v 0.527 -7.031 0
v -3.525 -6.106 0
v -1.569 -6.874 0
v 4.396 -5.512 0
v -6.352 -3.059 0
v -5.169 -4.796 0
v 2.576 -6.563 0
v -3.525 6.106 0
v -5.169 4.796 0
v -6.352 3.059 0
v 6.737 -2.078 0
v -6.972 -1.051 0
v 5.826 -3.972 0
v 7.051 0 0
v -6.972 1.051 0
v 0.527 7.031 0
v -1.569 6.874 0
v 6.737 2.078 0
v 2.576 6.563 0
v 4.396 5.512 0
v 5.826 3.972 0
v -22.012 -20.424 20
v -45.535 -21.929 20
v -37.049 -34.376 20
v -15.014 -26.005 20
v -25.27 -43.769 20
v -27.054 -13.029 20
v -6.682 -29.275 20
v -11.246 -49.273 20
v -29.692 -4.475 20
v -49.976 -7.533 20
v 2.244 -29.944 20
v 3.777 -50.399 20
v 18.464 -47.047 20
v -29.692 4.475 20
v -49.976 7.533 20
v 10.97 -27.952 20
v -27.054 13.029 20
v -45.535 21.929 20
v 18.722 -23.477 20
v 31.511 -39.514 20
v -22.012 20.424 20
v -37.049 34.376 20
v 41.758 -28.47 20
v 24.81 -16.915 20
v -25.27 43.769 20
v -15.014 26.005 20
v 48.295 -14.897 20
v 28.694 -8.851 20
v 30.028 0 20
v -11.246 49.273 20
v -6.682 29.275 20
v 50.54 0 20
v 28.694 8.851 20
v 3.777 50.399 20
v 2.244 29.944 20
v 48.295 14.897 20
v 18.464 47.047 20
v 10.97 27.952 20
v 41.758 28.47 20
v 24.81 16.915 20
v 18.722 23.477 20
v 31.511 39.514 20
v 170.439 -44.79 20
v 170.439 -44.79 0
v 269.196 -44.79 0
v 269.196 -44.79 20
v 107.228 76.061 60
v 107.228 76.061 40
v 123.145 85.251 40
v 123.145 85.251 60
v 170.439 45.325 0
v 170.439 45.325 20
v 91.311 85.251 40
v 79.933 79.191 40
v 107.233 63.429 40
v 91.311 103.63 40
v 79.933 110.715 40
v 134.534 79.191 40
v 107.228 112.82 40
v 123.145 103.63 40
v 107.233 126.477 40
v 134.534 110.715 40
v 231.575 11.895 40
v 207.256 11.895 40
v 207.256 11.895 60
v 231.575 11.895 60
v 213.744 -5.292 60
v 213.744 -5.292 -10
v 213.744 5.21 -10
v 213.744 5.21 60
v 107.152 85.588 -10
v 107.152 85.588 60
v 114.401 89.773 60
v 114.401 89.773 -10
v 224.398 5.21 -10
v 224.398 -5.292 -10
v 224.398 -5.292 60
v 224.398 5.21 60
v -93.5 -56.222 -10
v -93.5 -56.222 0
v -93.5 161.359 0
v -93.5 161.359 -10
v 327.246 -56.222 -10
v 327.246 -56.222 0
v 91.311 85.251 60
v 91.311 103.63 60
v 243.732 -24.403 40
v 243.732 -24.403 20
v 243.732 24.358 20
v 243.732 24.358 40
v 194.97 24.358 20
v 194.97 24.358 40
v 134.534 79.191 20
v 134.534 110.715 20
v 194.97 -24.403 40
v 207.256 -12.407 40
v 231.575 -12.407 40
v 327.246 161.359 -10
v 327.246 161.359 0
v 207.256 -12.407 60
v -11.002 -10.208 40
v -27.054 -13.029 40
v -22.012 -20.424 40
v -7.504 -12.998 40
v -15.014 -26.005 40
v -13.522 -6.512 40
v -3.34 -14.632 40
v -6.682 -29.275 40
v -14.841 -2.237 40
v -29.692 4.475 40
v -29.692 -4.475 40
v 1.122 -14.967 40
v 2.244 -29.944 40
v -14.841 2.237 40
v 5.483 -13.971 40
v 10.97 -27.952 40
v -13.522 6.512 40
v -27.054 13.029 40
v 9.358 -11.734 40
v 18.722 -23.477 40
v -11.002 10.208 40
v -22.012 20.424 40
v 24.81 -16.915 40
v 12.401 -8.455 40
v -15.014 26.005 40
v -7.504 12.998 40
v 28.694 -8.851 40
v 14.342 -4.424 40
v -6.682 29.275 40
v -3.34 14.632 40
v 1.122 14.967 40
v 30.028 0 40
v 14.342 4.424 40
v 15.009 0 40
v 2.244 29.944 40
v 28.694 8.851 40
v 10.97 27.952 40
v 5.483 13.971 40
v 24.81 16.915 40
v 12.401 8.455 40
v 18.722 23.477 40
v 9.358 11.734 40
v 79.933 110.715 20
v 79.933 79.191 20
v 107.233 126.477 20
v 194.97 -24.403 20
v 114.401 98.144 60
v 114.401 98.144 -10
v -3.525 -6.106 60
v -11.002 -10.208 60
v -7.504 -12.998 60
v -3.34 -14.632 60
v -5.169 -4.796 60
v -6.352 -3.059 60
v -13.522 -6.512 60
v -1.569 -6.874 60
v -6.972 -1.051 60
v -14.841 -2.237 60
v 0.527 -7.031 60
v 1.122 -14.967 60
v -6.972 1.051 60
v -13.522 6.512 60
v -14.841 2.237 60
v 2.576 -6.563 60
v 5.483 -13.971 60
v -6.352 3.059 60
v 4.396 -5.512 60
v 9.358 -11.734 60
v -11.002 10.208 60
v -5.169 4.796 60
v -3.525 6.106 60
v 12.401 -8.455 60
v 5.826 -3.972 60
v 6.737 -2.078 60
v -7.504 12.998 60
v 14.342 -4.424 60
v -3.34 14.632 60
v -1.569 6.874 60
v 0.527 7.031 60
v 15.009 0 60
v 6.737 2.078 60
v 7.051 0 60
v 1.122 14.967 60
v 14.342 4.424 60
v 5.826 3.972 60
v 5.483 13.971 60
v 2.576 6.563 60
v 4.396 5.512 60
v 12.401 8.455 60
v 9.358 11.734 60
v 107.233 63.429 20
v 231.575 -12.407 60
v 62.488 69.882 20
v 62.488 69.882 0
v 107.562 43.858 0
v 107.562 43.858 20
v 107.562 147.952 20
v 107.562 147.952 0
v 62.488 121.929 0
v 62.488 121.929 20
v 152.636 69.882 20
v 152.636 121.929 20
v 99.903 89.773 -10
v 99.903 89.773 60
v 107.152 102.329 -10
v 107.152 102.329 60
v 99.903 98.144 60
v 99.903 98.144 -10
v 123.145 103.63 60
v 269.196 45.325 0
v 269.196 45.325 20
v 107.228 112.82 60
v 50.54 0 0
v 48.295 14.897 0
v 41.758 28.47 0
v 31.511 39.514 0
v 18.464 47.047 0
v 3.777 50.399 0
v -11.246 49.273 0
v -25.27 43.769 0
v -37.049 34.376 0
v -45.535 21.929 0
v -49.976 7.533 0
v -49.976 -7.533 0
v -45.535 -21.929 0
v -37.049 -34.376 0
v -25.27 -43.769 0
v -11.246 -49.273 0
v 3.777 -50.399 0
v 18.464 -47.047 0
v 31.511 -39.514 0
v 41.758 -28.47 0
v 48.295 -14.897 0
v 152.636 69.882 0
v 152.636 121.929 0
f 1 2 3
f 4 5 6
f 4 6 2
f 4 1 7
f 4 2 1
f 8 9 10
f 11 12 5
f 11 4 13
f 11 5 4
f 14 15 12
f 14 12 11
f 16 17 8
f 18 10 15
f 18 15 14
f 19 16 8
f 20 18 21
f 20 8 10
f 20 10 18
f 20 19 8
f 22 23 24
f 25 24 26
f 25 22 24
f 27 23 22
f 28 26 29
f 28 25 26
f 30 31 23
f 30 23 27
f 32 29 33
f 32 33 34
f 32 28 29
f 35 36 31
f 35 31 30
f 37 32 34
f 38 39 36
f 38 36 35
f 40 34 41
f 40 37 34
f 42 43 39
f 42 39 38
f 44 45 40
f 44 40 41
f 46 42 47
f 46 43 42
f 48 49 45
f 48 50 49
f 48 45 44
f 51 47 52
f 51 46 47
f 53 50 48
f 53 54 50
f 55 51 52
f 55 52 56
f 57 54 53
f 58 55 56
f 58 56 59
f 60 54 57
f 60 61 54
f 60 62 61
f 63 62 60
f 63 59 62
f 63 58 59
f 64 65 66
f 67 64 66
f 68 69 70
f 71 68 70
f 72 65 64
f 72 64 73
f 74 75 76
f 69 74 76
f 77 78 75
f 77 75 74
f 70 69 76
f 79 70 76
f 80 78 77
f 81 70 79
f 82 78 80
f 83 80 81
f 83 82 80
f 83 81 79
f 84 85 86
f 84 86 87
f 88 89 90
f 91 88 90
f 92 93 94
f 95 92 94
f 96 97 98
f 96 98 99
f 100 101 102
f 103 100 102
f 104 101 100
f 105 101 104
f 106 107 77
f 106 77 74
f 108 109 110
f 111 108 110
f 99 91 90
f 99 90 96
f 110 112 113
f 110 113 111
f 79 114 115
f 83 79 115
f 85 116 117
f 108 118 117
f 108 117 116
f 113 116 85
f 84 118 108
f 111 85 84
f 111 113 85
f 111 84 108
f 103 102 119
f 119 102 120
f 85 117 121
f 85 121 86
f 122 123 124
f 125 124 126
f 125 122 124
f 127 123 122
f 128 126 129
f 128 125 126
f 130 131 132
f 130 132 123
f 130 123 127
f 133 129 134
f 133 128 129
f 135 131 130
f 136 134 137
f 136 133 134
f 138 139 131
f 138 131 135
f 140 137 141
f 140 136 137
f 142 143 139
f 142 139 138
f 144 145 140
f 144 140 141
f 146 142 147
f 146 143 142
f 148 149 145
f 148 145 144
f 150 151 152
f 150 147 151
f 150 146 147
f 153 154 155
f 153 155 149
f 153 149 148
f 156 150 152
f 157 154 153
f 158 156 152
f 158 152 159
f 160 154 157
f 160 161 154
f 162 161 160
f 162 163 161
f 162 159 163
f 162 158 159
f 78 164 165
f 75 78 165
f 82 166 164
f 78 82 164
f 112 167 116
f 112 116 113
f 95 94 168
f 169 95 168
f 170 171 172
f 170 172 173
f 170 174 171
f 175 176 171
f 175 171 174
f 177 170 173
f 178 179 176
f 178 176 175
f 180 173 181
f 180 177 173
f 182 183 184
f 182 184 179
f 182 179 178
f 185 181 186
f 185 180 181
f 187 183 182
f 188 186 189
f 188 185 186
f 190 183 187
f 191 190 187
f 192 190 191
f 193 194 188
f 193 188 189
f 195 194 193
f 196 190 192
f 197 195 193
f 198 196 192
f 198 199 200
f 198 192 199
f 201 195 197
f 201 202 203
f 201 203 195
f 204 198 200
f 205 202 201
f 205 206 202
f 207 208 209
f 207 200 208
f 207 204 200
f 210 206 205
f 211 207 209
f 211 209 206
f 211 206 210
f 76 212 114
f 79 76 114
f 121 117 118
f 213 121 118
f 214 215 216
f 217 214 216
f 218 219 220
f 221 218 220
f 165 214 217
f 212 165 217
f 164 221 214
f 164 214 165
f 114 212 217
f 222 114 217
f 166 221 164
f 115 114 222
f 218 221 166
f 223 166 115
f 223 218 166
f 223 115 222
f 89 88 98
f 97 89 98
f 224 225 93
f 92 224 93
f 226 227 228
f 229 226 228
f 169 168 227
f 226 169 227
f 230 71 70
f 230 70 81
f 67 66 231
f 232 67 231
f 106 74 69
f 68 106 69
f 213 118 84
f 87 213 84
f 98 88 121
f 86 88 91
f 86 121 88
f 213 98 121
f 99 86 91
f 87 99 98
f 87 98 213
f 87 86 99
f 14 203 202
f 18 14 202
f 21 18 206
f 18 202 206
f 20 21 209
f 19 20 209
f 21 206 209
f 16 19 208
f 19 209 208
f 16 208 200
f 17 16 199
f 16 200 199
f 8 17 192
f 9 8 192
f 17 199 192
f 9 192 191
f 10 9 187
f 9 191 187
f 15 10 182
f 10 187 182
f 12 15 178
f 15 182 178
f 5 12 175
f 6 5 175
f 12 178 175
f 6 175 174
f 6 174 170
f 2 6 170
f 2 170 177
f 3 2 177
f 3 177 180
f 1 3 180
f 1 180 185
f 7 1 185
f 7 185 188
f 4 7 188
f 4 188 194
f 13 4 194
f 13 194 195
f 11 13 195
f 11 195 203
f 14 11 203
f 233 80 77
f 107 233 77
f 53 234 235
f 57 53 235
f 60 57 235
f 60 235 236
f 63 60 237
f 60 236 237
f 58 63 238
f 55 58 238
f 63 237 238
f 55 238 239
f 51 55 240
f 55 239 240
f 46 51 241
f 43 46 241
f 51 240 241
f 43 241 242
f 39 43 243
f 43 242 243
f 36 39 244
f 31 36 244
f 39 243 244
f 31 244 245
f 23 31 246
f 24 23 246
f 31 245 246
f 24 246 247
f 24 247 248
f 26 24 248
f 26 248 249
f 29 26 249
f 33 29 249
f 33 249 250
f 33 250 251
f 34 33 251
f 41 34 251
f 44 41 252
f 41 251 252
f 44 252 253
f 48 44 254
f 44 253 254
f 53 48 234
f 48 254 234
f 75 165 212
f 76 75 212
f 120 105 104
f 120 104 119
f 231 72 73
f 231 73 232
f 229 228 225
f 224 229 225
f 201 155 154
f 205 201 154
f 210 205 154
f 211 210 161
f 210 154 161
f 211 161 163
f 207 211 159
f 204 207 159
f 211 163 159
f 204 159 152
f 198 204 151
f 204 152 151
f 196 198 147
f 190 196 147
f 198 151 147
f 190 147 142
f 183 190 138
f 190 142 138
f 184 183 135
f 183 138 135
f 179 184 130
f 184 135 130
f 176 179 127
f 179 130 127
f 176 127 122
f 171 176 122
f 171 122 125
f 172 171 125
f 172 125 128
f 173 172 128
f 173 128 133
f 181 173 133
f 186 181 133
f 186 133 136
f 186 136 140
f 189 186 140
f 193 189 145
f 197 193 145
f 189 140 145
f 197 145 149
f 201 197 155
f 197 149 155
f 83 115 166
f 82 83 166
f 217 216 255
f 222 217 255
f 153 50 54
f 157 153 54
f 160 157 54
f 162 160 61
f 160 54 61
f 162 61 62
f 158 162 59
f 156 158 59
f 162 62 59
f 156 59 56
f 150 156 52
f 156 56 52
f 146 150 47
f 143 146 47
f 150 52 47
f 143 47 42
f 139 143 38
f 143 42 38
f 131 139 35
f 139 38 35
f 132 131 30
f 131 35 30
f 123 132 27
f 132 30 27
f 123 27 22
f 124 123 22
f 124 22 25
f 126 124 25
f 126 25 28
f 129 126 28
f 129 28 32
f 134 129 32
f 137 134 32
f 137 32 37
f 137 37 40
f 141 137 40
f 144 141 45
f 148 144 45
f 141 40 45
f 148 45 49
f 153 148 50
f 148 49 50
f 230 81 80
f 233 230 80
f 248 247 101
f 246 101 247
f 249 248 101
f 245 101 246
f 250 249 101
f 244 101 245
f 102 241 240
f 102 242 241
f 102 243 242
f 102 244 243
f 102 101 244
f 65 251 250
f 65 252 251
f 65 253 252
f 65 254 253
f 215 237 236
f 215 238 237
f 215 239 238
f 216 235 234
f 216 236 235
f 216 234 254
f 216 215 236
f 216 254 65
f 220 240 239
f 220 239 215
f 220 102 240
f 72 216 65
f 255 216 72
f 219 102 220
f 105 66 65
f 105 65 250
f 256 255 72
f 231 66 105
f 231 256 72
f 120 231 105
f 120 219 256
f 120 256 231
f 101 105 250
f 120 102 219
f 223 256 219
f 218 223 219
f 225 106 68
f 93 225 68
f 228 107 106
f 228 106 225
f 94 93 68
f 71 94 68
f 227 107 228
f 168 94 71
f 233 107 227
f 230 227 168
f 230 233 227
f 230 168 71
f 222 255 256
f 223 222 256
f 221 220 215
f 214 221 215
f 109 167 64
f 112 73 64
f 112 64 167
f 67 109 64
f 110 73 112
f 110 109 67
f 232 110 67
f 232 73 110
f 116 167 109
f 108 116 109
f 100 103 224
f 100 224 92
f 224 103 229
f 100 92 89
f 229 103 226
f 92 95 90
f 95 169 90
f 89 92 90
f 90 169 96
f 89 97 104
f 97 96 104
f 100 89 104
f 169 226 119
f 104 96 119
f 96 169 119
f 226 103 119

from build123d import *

# Parameters (mm, degrees)
SKETCH_R        = 50.540208
PAD_DEPTH       = 20
SKETCH001_R     = 30.027683
PAD001_DEPTH    = 20
SKETCH002_R     = 15.008606
PAD002_DEPTH    = 20
SKETCH003_R     = 7.050667
POCKET_DEPTH    = 60.001
SKETCH004_W     = 420.746094
SKETCH004_H     = 217.580834
PAD003_DEPTH    = 10
SKETCH005_W     = 98.75679
SKETCH005_H     = 90.115562
PAD004_DEPTH    = 20
SKETCH006_W     = 48.761093
SKETCH006_H     = 48.761156
PAD005_DEPTH    = 20
SKETCH007_W     = 24.319153
SKETCH007_H     = 24.30114
PAD006_DEPTH    = 20
SKETCH008_W     = 10.654495
SKETCH008_H     = 10.502288
POCKET001_DEPTH = 70.001
PAD007_DEPTH    = 20
PAD008_DEPTH    = 20
PAD009_DEPTH    = 20
POCKET002_DEPTH = 70.001


with BuildPart() as part:
    # Sketch → Pad (new body)
    with BuildSketch(Plane.XY):
        Circle(SKETCH_R)
    extrude(amount=PAD_DEPTH)

    # Sketch001 (on Face3 of Pad) → Pad001 (join)
    with BuildSketch(Plane.XY.offset(20)):
        Circle(SKETCH001_R)
    extrude(amount=PAD001_DEPTH)

    # Sketch002 (on Face5 of Pad001) → Pad002 (join)
    with BuildSketch(Plane.XY.offset(40)):
        Circle(SKETCH002_R)
    extrude(amount=PAD002_DEPTH)

    # Sketch003 (on Face7 of Pad002) → Pocket (cut, through all)
    with BuildSketch(Plane.XY.offset(60)):
        Circle(SKETCH003_R)
    extrude(amount=-POCKET_DEPTH, mode=Mode.SUBTRACT)

    # Sketch004 → Pad003 (join)
    with BuildSketch(Plane.XY):
        with Locations((116.873352, 52.568348)):
            Rectangle(SKETCH004_W, SKETCH004_H)
    extrude(amount=-PAD003_DEPTH)

    # Sketch005 (on Face4 of Pad003) → Pad004 (join)
    with BuildSketch(Plane.XY):
        with Locations((219.817588, 0.267387)):
            Rectangle(SKETCH005_W, SKETCH005_H)
    extrude(amount=PAD004_DEPTH)

    # Sketch006 (on Face13 of Pad004) → Pad005 (join)
    with BuildSketch(Plane.XY.offset(20)):
        with Locations((219.351036, -0.022332)):
            Rectangle(SKETCH006_W, SKETCH006_H)
    extrude(amount=PAD005_DEPTH)

    # Sketch007 (on Face20 of Pad005) → Pad006 (join)
    with BuildSketch(Plane.XY.offset(40)):
        with Locations((219.415116, -0.255952)):
            Rectangle(SKETCH007_W, SKETCH007_H)
    extrude(amount=PAD006_DEPTH)

    # Sketch008 (on Face27 of Pad006) → Pocket001 (cut, through all)
    with BuildSketch(Plane.XY.offset(60)):
        with Locations((219.071236, -0.040661)):
            Rectangle(SKETCH008_W, SKETCH008_H)
    extrude(amount=-POCKET001_DEPTH, mode=Mode.SUBTRACT)

    # Sketch009 (on Face4 of Pocket001) → Pad007 (join)
    with BuildSketch(Plane.XY):
        Polygon((152.636142, 69.881975), (152.636142, 121.928939), (107.562149, 147.952421), (62.488156, 121.928939), (62.488156, 69.881975), (107.562149, 43.858493), align=None)
    extrude(amount=PAD007_DEPTH)

    # Sketch010 (on Face24 of Pad007) → Pad008 (join)
    with BuildSketch(Plane.XY.offset(20)):
        Polygon((107.233368, 63.429135), (134.533937, 79.191126), (134.533937, 110.715108), (107.233368, 126.477099), (79.932799, 110.715108), (79.932799, 79.191126), align=None)
    extrude(amount=PAD008_DEPTH)

    # Sketch011 (on Face43 of Pad008) → Pad009 (join)
    with BuildSketch(Plane.XY.offset(40)):
        Polygon((107.227683, 76.060802), (123.144716, 85.250505), (123.144716, 103.629912), (107.227683, 112.819615), (91.31065, 103.629912), (91.31065, 85.250505), align=None)
    extrude(amount=PAD009_DEPTH)

    # Sketch012 (on Face52 of Pad009) → Pocket002 (cut, through all)
    with BuildSketch(Plane.XY.offset(60)):
        Polygon((107.152039, 85.588319), (114.400809, 89.773399), (114.400809, 98.143557), (107.152039, 102.328637), (99.903269, 98.143557), (99.903269, 89.773399), align=None)
    extrude(amount=-POCKET002_DEPTH, mode=Mode.SUBTRACT)


solid = part.part
